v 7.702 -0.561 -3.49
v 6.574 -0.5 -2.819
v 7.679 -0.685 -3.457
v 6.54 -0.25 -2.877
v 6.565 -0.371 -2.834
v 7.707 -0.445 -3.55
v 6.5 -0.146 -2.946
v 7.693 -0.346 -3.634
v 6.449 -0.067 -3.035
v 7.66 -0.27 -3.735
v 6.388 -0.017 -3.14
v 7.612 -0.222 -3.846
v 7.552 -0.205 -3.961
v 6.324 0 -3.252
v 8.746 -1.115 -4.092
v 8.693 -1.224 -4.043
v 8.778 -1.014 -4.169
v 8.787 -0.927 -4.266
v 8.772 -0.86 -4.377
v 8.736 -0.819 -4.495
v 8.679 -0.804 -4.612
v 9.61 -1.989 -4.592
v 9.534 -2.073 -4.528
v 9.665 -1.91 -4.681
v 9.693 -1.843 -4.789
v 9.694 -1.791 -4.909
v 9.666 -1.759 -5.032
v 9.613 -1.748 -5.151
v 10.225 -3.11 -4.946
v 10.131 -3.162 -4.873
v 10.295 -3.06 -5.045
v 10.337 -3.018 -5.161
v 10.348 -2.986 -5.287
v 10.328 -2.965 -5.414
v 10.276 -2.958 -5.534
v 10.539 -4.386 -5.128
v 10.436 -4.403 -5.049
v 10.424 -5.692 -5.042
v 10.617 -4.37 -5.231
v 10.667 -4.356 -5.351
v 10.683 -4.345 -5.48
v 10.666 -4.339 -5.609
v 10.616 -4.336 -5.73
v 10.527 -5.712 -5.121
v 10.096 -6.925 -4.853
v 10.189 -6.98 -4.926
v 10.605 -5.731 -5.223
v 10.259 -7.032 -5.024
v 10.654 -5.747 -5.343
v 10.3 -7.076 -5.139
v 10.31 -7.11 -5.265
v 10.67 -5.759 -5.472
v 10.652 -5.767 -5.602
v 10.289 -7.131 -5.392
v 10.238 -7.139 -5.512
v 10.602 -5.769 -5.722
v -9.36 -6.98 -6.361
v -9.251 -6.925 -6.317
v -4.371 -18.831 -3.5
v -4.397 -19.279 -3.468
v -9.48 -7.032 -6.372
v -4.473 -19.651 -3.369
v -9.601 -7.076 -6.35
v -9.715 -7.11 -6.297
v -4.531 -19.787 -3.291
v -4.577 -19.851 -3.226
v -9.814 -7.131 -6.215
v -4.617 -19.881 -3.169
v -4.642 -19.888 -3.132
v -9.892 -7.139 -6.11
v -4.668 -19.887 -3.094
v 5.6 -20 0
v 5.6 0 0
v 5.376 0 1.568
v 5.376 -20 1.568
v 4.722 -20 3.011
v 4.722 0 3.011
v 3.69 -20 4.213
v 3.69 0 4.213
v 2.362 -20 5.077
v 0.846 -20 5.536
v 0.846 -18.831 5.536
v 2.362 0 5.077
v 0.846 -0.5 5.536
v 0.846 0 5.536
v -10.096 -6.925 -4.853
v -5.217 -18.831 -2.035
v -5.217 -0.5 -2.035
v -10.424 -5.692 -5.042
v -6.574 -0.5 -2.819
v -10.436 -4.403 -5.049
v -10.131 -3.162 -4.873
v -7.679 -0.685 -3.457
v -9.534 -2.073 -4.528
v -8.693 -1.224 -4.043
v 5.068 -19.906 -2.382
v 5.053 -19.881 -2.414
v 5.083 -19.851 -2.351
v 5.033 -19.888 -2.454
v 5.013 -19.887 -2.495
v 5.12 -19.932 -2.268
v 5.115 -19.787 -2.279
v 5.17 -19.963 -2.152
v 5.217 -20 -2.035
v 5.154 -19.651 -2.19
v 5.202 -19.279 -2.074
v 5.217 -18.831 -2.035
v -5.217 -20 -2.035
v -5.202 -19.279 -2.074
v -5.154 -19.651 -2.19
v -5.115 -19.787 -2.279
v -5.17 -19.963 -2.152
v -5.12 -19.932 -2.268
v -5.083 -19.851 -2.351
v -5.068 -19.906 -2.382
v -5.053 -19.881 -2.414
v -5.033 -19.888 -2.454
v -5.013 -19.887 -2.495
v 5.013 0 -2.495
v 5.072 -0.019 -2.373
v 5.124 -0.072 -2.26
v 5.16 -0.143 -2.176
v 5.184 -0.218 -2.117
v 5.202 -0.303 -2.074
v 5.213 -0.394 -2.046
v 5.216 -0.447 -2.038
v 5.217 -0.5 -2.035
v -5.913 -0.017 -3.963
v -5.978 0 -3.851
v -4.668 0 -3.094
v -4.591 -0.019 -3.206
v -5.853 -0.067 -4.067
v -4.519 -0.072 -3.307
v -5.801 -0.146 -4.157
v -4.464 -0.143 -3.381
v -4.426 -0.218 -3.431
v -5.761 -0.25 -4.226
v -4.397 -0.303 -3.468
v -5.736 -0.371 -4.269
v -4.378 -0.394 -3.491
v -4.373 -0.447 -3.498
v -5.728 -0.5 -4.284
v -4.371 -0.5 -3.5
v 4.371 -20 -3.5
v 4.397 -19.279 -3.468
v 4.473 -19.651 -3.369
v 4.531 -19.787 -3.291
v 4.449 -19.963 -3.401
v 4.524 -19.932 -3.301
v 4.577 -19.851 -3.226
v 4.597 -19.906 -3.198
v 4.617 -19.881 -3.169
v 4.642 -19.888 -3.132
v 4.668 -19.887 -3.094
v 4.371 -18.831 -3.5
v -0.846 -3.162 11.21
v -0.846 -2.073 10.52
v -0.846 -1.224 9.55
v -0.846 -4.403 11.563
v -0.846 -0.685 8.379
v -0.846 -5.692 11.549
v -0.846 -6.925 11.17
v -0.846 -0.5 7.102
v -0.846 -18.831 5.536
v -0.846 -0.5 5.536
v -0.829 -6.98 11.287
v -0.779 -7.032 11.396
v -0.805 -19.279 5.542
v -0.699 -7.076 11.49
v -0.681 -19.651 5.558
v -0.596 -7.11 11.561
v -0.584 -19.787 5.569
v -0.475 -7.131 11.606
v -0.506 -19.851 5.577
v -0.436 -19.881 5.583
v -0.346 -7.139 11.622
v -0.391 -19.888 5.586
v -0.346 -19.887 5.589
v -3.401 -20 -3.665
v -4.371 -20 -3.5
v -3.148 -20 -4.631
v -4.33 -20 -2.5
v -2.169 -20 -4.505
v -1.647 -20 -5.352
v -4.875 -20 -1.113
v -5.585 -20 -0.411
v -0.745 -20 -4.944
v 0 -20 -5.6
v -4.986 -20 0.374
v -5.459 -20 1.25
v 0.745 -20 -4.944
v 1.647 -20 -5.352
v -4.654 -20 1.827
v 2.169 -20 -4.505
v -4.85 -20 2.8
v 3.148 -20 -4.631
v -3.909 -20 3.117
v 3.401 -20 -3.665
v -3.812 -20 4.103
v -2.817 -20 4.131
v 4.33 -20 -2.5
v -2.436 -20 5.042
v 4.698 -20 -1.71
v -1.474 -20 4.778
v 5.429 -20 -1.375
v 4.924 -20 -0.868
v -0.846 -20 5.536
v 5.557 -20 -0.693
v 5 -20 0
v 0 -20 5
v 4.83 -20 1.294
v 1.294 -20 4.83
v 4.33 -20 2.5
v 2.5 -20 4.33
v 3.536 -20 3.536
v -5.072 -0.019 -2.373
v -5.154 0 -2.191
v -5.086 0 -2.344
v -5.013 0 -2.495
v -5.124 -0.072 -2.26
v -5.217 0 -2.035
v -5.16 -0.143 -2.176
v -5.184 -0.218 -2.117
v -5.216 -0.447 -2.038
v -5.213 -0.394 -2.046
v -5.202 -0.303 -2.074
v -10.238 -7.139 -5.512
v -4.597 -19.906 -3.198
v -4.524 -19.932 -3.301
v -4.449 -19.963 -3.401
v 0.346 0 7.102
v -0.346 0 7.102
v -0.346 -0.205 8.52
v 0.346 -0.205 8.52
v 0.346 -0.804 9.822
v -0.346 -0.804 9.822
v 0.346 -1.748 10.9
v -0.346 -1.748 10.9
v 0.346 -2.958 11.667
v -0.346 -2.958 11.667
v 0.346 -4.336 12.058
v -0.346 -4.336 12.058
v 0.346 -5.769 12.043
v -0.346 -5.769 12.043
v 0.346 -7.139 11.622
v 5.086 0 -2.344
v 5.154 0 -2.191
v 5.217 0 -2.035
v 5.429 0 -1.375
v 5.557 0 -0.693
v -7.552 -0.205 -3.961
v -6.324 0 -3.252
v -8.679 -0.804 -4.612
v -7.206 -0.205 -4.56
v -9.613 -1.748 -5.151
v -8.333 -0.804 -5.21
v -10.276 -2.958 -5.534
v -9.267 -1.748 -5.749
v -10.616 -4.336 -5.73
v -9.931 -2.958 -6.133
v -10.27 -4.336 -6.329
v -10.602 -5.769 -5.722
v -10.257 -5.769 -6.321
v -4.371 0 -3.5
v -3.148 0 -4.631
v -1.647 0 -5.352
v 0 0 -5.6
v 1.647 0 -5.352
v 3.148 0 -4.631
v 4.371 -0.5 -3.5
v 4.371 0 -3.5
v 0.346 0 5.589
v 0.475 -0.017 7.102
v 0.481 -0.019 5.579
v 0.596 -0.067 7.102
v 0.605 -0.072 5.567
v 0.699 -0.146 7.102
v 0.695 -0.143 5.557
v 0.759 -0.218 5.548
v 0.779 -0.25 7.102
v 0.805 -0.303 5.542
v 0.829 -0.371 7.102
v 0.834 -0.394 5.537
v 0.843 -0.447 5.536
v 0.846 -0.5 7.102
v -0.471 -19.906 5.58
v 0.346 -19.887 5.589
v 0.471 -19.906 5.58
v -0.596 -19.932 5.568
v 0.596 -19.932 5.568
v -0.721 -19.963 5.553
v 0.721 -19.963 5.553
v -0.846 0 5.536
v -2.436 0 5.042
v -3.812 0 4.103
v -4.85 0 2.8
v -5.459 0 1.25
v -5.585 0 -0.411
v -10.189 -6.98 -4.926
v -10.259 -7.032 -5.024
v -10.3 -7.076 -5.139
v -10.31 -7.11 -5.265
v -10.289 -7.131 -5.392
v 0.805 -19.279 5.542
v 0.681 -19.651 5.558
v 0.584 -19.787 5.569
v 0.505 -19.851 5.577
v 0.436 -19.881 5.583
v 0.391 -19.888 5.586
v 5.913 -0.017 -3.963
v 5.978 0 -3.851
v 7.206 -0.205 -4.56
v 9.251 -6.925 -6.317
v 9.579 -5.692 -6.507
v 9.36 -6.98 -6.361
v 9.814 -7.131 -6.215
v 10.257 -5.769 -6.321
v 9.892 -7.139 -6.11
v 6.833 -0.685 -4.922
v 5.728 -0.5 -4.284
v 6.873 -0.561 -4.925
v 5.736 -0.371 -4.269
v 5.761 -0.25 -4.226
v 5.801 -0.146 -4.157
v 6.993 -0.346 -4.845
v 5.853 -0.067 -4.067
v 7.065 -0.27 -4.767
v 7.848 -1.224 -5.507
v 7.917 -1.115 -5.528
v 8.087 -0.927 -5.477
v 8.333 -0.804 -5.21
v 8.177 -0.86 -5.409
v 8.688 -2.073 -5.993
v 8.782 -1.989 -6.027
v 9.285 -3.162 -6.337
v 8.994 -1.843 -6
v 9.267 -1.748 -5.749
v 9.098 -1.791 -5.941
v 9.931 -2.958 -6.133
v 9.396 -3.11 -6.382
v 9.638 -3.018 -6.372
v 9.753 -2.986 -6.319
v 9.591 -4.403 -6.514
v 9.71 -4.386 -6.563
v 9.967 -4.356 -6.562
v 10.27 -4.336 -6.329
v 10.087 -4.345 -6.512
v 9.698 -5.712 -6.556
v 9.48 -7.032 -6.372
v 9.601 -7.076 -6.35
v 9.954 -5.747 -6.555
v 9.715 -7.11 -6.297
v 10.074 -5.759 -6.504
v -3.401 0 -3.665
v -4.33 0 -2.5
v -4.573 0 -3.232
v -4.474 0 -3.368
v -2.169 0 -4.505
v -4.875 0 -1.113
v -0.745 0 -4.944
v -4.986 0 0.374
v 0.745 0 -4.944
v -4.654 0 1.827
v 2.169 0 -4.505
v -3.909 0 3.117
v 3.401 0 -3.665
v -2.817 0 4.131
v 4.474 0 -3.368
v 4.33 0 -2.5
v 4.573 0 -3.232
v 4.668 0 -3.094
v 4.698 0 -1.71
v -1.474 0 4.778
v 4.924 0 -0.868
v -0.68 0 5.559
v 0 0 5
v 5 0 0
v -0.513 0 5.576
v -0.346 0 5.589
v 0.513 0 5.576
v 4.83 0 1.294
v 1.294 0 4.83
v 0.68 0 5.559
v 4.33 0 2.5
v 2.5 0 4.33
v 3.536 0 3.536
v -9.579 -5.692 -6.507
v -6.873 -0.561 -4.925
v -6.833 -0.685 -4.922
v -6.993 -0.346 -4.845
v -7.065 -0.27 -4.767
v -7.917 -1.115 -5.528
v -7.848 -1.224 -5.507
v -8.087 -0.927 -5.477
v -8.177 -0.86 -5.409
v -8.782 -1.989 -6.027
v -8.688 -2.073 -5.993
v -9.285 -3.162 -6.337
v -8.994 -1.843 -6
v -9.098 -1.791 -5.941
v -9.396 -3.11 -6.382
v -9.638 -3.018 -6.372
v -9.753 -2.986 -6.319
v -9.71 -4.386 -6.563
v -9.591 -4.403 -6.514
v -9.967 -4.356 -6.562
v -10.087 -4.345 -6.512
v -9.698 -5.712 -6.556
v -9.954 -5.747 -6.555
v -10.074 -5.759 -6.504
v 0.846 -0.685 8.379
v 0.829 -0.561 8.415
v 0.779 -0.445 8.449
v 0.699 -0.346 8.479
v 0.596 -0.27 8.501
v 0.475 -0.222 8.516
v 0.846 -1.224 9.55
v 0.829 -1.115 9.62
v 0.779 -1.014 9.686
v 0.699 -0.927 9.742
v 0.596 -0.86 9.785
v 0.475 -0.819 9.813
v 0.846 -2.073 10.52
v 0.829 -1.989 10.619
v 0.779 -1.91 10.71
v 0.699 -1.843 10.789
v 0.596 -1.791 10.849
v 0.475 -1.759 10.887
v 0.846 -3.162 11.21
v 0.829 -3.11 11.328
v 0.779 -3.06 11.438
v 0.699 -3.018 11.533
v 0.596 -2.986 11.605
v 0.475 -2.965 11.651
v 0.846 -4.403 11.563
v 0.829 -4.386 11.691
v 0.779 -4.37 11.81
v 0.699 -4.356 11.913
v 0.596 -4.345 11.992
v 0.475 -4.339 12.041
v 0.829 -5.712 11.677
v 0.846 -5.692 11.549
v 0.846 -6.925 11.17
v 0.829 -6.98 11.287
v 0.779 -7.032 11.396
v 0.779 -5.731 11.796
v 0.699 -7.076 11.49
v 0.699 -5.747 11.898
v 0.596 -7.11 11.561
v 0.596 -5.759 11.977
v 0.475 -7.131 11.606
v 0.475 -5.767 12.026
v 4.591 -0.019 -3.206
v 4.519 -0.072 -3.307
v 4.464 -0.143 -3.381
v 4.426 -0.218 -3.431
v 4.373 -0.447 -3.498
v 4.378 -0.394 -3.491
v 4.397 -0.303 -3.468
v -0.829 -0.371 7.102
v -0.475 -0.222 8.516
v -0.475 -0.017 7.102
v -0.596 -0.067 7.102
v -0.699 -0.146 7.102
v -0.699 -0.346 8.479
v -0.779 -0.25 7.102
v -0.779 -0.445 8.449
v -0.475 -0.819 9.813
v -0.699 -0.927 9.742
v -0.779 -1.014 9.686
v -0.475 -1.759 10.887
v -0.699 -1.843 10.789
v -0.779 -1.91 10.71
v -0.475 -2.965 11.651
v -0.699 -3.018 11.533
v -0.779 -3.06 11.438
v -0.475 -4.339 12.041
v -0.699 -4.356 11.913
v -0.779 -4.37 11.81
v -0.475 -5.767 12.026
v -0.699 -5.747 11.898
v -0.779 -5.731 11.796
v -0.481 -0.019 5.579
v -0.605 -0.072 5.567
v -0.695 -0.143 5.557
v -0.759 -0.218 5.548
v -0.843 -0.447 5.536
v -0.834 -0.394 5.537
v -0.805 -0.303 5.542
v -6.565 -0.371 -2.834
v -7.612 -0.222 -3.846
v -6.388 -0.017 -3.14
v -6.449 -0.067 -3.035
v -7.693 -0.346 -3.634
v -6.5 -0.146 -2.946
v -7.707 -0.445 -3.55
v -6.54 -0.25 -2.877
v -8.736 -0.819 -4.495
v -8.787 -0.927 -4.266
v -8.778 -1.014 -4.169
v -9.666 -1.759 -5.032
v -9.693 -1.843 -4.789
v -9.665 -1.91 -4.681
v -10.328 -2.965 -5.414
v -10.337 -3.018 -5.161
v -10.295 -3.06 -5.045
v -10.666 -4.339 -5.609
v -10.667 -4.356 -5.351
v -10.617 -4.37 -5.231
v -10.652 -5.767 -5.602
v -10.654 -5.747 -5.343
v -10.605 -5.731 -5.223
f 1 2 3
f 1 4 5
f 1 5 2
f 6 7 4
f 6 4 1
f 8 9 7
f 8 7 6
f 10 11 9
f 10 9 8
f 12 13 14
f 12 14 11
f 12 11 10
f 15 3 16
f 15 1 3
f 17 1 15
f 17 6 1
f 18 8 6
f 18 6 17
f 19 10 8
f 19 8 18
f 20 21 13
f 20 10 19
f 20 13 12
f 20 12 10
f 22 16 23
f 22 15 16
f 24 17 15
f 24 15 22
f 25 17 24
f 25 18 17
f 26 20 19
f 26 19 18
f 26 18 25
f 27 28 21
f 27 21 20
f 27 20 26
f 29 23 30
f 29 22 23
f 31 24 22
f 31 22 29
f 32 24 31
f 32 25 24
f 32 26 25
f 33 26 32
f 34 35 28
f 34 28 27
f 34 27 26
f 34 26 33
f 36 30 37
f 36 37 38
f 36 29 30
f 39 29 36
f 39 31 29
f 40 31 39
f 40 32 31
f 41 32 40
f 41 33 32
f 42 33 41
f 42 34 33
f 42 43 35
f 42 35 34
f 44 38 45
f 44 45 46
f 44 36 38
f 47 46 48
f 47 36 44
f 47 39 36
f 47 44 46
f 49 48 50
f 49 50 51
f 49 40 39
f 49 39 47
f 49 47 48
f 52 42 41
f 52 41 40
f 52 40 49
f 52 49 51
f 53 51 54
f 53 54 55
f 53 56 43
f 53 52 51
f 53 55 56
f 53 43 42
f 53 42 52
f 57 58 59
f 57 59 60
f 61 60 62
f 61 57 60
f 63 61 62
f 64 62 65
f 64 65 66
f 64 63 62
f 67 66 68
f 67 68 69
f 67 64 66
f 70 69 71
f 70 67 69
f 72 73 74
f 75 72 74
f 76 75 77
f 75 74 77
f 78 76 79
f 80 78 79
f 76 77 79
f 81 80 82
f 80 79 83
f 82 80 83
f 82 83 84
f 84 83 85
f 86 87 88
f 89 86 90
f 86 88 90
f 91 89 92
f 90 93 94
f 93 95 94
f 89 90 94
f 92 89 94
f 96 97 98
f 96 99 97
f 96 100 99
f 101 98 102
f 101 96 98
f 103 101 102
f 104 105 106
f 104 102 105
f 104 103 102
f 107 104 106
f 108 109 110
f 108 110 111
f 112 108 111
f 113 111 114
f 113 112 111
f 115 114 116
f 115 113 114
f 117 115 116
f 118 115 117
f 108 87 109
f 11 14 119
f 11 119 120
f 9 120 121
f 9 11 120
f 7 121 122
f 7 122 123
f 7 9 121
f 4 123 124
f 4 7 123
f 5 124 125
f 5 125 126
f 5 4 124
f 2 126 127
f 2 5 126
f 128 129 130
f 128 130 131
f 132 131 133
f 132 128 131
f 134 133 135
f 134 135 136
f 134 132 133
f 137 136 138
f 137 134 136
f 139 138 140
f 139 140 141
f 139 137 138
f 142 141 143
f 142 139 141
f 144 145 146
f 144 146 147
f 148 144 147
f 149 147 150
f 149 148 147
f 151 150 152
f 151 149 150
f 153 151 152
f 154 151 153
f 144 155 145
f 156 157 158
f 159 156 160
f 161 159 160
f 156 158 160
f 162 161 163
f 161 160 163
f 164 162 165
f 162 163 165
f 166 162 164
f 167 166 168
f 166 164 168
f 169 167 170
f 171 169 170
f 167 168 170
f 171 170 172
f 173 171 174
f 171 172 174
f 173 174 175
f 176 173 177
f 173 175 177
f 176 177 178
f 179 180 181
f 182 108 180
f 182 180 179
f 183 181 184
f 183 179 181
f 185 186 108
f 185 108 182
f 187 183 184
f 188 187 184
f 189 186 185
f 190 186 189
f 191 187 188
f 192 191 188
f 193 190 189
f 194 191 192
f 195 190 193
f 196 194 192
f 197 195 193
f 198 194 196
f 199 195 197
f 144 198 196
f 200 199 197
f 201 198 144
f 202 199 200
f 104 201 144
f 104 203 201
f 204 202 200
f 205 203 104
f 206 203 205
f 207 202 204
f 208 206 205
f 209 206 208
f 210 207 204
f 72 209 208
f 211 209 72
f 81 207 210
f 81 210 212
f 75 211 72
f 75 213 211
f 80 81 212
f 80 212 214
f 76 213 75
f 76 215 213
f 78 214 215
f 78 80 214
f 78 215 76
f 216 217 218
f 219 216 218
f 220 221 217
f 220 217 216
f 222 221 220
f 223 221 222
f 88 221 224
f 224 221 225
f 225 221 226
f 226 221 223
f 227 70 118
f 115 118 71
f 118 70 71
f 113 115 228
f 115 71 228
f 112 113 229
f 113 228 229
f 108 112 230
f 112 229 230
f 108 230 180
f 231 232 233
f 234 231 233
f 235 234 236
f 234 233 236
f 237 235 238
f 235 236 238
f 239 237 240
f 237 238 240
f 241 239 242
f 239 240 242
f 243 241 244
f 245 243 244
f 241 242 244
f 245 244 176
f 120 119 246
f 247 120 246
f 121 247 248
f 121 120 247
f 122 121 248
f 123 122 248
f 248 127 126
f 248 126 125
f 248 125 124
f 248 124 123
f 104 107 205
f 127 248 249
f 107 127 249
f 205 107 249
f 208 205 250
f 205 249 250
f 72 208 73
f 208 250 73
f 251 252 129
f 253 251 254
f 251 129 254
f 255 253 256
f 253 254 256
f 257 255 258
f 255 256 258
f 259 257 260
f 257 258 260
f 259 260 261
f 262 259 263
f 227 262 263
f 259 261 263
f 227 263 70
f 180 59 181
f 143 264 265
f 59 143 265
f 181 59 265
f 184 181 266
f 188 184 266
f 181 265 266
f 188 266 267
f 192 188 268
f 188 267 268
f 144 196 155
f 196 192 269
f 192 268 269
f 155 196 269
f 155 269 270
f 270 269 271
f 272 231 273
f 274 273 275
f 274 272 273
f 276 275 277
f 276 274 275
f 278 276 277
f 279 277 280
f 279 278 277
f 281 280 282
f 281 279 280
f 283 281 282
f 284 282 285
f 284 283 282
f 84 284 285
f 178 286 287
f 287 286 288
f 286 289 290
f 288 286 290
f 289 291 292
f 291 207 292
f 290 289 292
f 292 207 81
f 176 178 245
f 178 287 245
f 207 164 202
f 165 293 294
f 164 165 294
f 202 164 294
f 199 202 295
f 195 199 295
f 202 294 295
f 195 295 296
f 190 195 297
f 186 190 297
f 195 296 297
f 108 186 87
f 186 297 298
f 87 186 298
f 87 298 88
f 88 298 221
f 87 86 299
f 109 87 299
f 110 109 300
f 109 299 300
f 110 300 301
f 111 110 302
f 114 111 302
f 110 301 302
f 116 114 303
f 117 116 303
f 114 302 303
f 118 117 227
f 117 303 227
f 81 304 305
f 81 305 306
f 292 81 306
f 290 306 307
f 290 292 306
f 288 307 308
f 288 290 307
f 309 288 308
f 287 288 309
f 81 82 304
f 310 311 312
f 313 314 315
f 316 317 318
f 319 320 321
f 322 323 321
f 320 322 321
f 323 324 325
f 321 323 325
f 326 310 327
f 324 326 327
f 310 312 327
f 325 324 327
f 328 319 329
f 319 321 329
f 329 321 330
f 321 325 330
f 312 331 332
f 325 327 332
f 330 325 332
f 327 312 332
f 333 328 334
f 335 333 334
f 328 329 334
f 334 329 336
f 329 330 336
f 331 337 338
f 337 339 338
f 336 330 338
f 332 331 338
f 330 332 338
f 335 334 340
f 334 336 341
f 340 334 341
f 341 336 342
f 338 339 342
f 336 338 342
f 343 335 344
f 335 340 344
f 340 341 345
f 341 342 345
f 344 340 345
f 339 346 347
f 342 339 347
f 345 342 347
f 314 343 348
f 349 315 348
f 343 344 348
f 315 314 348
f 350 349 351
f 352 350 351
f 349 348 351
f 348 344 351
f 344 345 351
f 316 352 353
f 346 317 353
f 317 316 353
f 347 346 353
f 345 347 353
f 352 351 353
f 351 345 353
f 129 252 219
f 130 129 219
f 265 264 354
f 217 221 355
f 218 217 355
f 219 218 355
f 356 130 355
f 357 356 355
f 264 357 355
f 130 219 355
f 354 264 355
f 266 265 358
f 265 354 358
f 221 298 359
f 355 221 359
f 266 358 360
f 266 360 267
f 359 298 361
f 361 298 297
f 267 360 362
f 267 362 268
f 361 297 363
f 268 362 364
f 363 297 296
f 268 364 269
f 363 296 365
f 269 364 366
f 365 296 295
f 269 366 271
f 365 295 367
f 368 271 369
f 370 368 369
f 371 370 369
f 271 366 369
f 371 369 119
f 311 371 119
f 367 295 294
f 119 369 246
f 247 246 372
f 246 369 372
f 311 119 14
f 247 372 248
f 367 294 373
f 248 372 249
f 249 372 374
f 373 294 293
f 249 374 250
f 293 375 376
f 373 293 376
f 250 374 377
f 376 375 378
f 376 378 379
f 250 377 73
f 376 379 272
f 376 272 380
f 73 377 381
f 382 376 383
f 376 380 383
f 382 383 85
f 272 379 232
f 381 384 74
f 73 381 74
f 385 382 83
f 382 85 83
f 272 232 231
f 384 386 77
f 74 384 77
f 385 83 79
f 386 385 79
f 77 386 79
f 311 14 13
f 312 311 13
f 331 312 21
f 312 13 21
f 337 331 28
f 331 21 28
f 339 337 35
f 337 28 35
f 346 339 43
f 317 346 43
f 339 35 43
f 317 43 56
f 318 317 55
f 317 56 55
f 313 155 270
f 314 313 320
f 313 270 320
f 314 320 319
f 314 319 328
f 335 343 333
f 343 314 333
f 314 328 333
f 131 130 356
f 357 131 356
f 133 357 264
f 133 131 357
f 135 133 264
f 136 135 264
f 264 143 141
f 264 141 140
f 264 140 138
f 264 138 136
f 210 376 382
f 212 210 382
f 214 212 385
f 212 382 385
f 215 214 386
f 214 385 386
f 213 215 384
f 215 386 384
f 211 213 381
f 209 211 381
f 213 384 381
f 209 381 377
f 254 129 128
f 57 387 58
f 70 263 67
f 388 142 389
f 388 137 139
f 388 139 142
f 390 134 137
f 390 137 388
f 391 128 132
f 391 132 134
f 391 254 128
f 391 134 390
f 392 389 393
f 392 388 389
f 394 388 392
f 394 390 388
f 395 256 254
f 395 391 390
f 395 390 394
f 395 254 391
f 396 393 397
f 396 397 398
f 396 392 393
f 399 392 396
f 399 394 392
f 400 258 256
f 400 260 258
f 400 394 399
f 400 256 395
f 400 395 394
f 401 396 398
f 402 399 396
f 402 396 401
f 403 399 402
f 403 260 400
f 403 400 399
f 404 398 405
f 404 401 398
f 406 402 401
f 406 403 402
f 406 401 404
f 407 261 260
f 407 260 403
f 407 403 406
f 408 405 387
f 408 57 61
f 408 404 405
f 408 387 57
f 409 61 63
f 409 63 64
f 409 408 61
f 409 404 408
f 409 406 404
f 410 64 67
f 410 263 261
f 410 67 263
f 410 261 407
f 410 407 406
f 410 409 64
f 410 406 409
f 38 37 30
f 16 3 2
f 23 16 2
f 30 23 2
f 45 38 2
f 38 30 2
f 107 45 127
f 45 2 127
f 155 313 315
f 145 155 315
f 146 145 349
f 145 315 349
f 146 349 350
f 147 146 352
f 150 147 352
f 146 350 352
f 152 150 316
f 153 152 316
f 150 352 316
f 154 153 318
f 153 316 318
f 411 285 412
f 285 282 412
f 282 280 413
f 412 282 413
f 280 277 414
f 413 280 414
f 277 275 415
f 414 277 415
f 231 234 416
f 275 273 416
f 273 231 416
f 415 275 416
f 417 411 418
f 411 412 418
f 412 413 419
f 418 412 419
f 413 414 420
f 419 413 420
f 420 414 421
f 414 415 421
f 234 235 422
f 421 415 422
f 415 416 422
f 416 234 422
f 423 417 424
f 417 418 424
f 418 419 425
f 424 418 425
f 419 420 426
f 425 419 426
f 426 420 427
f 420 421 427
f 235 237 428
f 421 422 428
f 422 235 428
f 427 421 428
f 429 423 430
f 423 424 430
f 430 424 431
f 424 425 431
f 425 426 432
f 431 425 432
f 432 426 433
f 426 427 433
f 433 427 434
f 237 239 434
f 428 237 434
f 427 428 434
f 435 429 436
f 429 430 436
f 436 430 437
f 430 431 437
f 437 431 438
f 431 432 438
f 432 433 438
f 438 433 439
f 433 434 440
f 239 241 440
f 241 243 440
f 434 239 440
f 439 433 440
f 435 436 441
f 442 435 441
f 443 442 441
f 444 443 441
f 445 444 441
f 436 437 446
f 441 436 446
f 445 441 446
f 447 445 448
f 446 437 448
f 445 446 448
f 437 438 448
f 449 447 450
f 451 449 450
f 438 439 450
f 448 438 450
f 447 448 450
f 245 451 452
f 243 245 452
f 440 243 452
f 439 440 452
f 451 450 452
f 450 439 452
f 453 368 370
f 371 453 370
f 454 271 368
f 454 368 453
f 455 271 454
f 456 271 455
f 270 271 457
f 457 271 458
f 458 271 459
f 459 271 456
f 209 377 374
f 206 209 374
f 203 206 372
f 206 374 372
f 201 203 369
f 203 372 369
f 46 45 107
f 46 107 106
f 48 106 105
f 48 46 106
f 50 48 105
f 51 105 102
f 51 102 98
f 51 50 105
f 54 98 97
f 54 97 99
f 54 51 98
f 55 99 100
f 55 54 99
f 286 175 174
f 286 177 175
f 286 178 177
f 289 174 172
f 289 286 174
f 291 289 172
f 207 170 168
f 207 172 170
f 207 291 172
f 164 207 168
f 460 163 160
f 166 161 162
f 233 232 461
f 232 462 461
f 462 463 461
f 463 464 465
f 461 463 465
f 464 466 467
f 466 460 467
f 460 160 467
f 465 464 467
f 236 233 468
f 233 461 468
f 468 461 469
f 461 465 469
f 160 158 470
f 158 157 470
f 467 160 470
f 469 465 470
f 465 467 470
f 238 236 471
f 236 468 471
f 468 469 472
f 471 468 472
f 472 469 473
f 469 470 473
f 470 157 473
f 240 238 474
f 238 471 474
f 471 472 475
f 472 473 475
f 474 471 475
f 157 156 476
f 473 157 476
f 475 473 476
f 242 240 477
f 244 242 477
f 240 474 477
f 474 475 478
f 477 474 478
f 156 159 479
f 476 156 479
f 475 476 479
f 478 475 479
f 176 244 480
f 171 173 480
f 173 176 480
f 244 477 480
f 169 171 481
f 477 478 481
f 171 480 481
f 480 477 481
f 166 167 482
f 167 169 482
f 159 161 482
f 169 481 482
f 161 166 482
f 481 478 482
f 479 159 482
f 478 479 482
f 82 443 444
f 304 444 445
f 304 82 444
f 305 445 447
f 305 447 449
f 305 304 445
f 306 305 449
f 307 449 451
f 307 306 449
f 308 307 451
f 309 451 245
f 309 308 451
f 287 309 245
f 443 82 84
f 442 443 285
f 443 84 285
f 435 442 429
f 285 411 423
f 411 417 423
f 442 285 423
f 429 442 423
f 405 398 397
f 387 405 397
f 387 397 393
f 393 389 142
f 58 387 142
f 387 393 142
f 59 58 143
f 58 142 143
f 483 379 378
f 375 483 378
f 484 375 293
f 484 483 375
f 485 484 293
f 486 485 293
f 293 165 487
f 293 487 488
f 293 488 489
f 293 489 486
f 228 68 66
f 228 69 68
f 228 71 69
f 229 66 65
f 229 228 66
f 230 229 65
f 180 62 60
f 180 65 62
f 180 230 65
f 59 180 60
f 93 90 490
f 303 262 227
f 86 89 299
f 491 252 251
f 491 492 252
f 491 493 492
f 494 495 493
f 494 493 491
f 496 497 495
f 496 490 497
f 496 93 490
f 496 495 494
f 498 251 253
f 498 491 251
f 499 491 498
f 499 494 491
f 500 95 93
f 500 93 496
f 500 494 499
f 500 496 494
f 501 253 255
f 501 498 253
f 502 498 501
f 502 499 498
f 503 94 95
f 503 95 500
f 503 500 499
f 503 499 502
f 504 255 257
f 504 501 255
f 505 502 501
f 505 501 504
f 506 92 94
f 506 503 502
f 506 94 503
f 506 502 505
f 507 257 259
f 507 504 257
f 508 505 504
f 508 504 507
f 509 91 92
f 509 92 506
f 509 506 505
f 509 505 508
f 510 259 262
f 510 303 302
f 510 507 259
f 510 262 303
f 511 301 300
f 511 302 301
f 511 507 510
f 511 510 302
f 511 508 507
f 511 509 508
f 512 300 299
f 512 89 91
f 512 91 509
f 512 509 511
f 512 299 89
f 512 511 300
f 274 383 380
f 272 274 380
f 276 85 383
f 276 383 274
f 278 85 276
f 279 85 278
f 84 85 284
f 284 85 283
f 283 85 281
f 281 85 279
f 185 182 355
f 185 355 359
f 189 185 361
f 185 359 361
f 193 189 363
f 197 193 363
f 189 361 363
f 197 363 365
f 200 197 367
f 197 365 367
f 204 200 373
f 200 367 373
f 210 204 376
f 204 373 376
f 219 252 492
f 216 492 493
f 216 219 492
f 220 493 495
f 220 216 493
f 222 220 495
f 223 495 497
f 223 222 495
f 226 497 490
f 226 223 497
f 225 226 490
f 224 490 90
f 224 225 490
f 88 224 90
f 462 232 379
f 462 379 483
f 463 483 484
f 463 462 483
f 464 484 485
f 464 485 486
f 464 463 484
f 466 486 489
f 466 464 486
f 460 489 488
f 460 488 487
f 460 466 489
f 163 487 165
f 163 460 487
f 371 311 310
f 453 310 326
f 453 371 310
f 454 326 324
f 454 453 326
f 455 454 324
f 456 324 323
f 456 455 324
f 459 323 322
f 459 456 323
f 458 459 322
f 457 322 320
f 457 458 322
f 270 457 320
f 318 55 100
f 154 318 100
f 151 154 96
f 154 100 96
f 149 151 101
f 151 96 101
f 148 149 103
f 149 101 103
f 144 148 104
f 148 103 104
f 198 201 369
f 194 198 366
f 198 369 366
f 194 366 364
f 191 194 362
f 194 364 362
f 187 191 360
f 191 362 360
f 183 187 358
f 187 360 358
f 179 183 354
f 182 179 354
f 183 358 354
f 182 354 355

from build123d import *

# Parameters (mm, degrees)
F1_DEPTH      = 20
F2_DEPTH      = 20
F4_DEPTH      = 14.8
F5_R          = 5
F6_DEPTH      = 20
F8_DEPTH      = 25
F10_DEPTH     = 25
F11_R         = 5
F12_T4_DEPTH  = 15.4786422769
F12_S5_R      = 5.6
F12_T6_DEPTH  = 9
F12_T10_DEPTH = 15.4786422769
F12_S11_R     = 5.6
F12_T12_DEPTH = 9
F12_T14_ANGLE = 115.3240588084
F12_T16_ANGLE = 115.3240588084
F12_T20_DEPTH = 2.8166081333
F12_S21_R     = 5.6
F12_T22_DEPTH = 3
F12_T26_DEPTH = 2.8166081333
F12_S27_R     = 5.6
F12_T28_DEPTH = 3
F13_T4_DEPTH  = 15.4786422769
F13_S5_R      = 5.6
F13_T6_DEPTH  = 9
F13_T10_DEPTH = 15.4786422769
F13_S11_R     = 5.6
F13_T12_DEPTH = 10
F13_T16_DEPTH = 15.4786422769
F13_S17_R     = 5.6
F13_T18_DEPTH = 10
F13_T22_DEPTH = 15.4786422769
F13_S23_R     = 5.6
F13_T24_DEPTH = 9
F13_T28_DEPTH = 2.8166081333
F13_S29_R     = 5.6
F13_T30_DEPTH = 3
F13_T34_DEPTH = 2.8166081333
F13_S35_R     = 5.6
F13_T36_DEPTH = 3
F13_T40_DEPTH = 2.8166081333
F13_S41_R     = 5.6
F13_T42_DEPTH = 3
F13_T46_DEPTH = 2.8166081333
F13_S47_R     = 5.6
F13_T48_DEPTH = 3
F13_T50_ANGLE = 115.3240588084
F13_T52_ANGLE = 115.3240588084
F13_T54_ANGLE = 115.3240588084
F13_T56_ANGLE = 115.3240588084


# Not quite as in the source:
# - a fillet or chamfer that OpenCascade refuses, or shapes differently, is made with other operations: its cross-section is extruded or revolved along the edge and cut away or added


with BuildPart() as f1:
    # F0 (on Front) → F1 (new body)
    with BuildSketch(Plane.XZ):
        with BuildLine():
            ThreePointArc((-4.3301270189, -2.5), (-4.3301270189, 2.5), (0, 5))
            Line((0, 5), (-0.8457466924, 5))
            Line((-0.8457466924, 5), (-0.8457466924, 5.5357666617))
            ThreePointArc((-0.8457466924, 5.5357666617), (-4.8497422612, 2.8), (-5.2169879046, -2.03544521))
            Line((-5.2169879046, -2.03544521), (-4.7530003651, -1.7675618792))
            Line((-4.7530003651, -1.7675618792), (-4.3301270189, -2.5))
        make_face()
        with BuildLine():
            Line((3.9072536727, -3.2324381208), (4.3301270189, -2.5))
            ThreePointArc((4.3301270189, -2.5), (0, -5), (-4.3301270189, -2.5))
            Line((-4.3301270189, -2.5), (-3.9072536727, -3.2324381208))
            Line((-3.9072536727, -3.2324381208), (-4.3712412122, -3.5003214516))
            ThreePointArc((-4.3712412122, -3.5003214516), (0, -5.6), (4.3712412122, -3.5003214516))
            Line((4.3712412122, -3.5003214516), (3.9072536727, -3.2324381208))
        make_face()
        with BuildLine():
            Line((-3.9072536727, -3.2324381208), (-4.3301270189, -2.5))
            Line((-4.3301270189, -2.5), (-4.8497422612, -2.8))
            ThreePointArc((-4.8497422612, -2.8), (-4.6237697378, -3.1592330417), (-4.3712412122, -3.5003214516))
            Line((-4.3712412122, -3.5003214516), (-3.9072536727, -3.2324381208))
        make_face()
        with BuildLine():
            Line((-4.8497422612, -2.8), (-4.3301270189, -2.5))
            Line((-4.3301270189, -2.5), (-4.7530003651, -1.7675618792))
            Line((-4.7530003651, -1.7675618792), (-5.2169879046, -2.03544521))
            ThreePointArc((-5.2169879046, -2.03544521), (-5.0478609395, -2.4246855333), (-4.8497422612, -2.8))
        make_face()
        with BuildLine():
            Line((4.8497422612, -2.8), (4.3301270189, -2.5))
            Line((4.3301270189, -2.5), (3.9072536727, -3.2324381208))
            Line((3.9072536727, -3.2324381208), (4.3712412122, -3.5003214516))
            ThreePointArc((4.3712412122, -3.5003214516), (4.6237697378, -3.1592330417), (4.8497422612, -2.8))
        make_face()
        with BuildLine():
            Line((4.7530003651, -1.7675618792), (4.3301270189, -2.5))
            Line((4.3301270189, -2.5), (4.8497422612, -2.8))
            ThreePointArc((4.8497422612, -2.8), (5.0478609395, -2.4246855333), (5.2169879046, -2.03544521))
            Line((5.2169879046, -2.03544521), (4.7530003651, -1.7675618792))
        make_face()
        with BuildLine():
            ThreePointArc((0, 5), (3.5355339059, 3.5355339059), (5, 0))
            ThreePointArc((5, 0), (4.8296291314, -1.2940952255), (4.3301270189, -2.5))
            Line((4.3301270189, -2.5), (4.7530003651, -1.7675618792))
            Line((4.7530003651, -1.7675618792), (5.2169879046, -2.03544521))
            ThreePointArc((5.2169879046, -2.03544521), (5.5034140434, -1.0355838291), (5.6, 0))
            ThreePointArc((5.6, 0), (4.2483044546, 3.6485489254), (0.8457466924, 5.5357666617))
            Line((0.8457466924, 5.5357666617), (0.8457466924, 5))
            Line((0.8457466924, 5), (0, 5))
        make_face()
        with BuildLine():
            Line((0, 5.6), (0, 5))
            Line((0, 5), (0.8457466924, 5))
            Line((0.8457466924, 5), (0.8457466924, 5.5357666617))
            ThreePointArc((0.8457466924, 5.5357666617), (0.4240912017, 5.583918575), (0, 5.6))
        make_face()
        with BuildLine():
            Line((-0.8457466924, 5), (0, 5))
            Line((0, 5), (0, 5.6))
            ThreePointArc((0, 5.6), (-0.4240912017, 5.583918575), (-0.8457466924, 5.5357666617))
            Line((-0.8457466924, 5.5357666617), (-0.8457466924, 5))
        make_face()
    extrude(amount=F1_DEPTH)

    # F0 (on Front) → F2 (join)
    with BuildSketch(Plane.XZ):
        with BuildLine():
            ThreePointArc((-4.3712412122, -3.5003214516), (-4.6237697378, -3.1592330417), (-4.8497422612, -2.8))
            Line((-4.8497422612, -2.8), (-12.9903810568, -7.5))
            Line((-12.9903810568, -7.5), (-12.5675077106, -8.2324381208))
            Line((-12.5675077106, -8.2324381208), (-4.3712412122, -3.5003214516))
        make_face()
        with BuildLine():
            Line((-12.9903810568, -7.5), (-4.8497422612, -2.8))
            ThreePointArc((-4.8497422612, -2.8), (-5.0478609395, -2.4246855333), (-5.2169879046, -2.03544521))
            Line((-5.2169879046, -2.03544521), (-13.413254403, -6.7675618792))
            Line((-13.413254403, -6.7675618792), (-12.9903810568, -7.5))
        make_face()
    extrude(amount=F2_DEPTH)

    # F3 (on face) → F4 (cut)
    with BuildSketch(Plane(origin=(0.4228733462, 0, -0.7324381208), x_dir=(0.8660254038, 0, 0.5), z_dir=(0.5, 0, -0.8660254038))):
        Polygon((-15, 0), (-5.5357666617, 20), (-15, 20), align=None)
    extrude(amount=-F4_DEPTH, mode=Mode.SUBTRACT)

    # F5
    f5_edges = [f1.edges().sort_by_distance(p)[0] for p in [
        (-12.990381, 0, -7.5),
    ]]
    fillet(f5_edges, radius=F5_R)

    # F0 (on Front) → F6 (join)
    with BuildSketch(Plane.XZ):
        with BuildLine():
            ThreePointArc((-0.8457466924, 5.5357666617), (-0.4240912017, 5.583918575), (0, 5.6))
            Line((0, 5.6), (0, 15))
            Line((0, 15), (-0.8457466924, 15))
            Line((-0.8457466924, 15), (-0.8457466924, 5.5357666617))
        make_face()
        with BuildLine():
            Line((0, 15), (0, 5.6))
            ThreePointArc((0, 5.6), (0.4240912017, 5.583918575), (0.8457466924, 5.5357666617))
            Line((0.8457466924, 5.5357666617), (0.8457466924, 15))
            Line((0.8457466924, 15), (0, 15))
        make_face()
        with BuildLine():
            ThreePointArc((5.2169879046, -2.03544521), (5.0478609395, -2.4246855333), (4.8497422612, -2.8))
            Line((4.8497422612, -2.8), (12.9903810568, -7.5))
            Line((12.9903810568, -7.5), (13.413254403, -6.7675618792))
            Line((13.413254403, -6.7675618792), (5.2169879046, -2.03544521))
        make_face()
        with BuildLine():
            Line((12.9903810568, -7.5), (4.8497422612, -2.8))
            ThreePointArc((4.8497422612, -2.8), (4.6237697378, -3.1592330417), (4.3712412122, -3.5003214516))
            Line((4.3712412122, -3.5003214516), (12.5675077106, -8.2324381208))
            Line((12.5675077106, -8.2324381208), (12.9903810568, -7.5))
        make_face()
    extrude(amount=F6_DEPTH)

    # F7 (on face) → F8 (cut)
    with BuildSketch(Plane(origin=(0.4228733462, 0, 0.7324381208), x_dir=(0.8660254038, 0, -0.5), z_dir=(0.5, 0, 0.8660254038))):
        Polygon((15, 0), (5.5357666617, -20), (15, -20), align=None)
    extrude(amount=-F8_DEPTH, mode=Mode.SUBTRACT)

    # F9 (on face) → F10 (cut)
    with BuildSketch(Plane.YZ.offset(0.8457466924)):
        Polygon((-20, 15), (-20, 5.5357666617), (0, 15), align=None)
    extrude(amount=-F10_DEPTH, mode=Mode.SUBTRACT)

    # F11
    f11_edges = [f1.edges().sort_by_distance(p)[0] for p in [
        (12.990381, 0, -7.5),
        (0, 0, 15),
    ]]
    fillet(f11_edges, radius=F11_R)

    # F12: fillet of radius 0.5 on 4 edges, made by hand


with BuildPart() as f12_tool2:
    # F12_s3 → F12_t4 (new body)
    with BuildSketch(Plane(origin=(0, -15.3303811163, -7.2545152025), x_dir=(1, 0, 0), z_dir=(0, 0.9039030201, 0.4277374549))):
        with BuildLine():
            ThreePointArc((0.8457466924, -13.0585453012), (0.699300083, -13.4120986918), (0.3457466924, -13.5585453012))
            Line((0.3457466924, -13.5585453012), (0.8457466924, -13.5585453012))
            Line((0.8457466924, -13.5585453012), (0.8457466924, -13.0585453012))
        make_face()
    extrude(amount=F12_T4_DEPTH)

    # F12_s5 → F12_t6 (cut, symmetric)
    with BuildSketch(Plane.XZ.offset(14)):
        Circle(F12_S5_R)
    extrude(amount=F12_T6_DEPTH, both=True, mode=Mode.SUBTRACT)


with BuildPart() as f1_1:
    add(f1.part)

    # F12_t1: cut F12_tool2
    add(f12_tool2.part, mode=Mode.SUBTRACT)


with BuildPart() as f12_tool8:
    # F12_s9 → F12_t10 (new body)
    with BuildSketch(Plane(origin=(0, -15.3303811163, -7.2545152025), x_dir=(1, 0, 0), z_dir=(0, 0.9039030201, 0.4277374549))):
        with BuildLine():
            ThreePointArc((-0.8457466924, -13.0585453012), (-0.699300083, -13.4120986918), (-0.3457466924, -13.5585453012))
            Line((-0.3457466924, -13.5585453012), (-0.8457466924, -13.5585453012))
            Line((-0.8457466924, -13.5585453012), (-0.8457466924, -13.0585453012))
        make_face()
    extrude(amount=F12_T10_DEPTH)

    # F12_s11 → F12_t12 (cut, symmetric)
    with BuildSketch(Plane.XZ.offset(14)):
        Circle(F12_S11_R)
    extrude(amount=F12_T12_DEPTH, both=True, mode=Mode.SUBTRACT)


with BuildPart() as f1_2:
    add(f1_1.part)

    # F12_t7: cut F12_tool8
    add(f12_tool8.part, mode=Mode.SUBTRACT)

    # F12_s13 → F12_t14 (revolve, cut)
    with BuildSketch(Plane.XY.offset(7.1023747949)):
        with BuildLine():
            ThreePointArc((0.8457466924, -0.5), (0.699300083, -0.1464466094), (0.3457466924, 0))
            Line((0.3457466924, 0), (0.8457466924, 0))
            Line((0.8457466924, 0), (0.8457466924, -0.5))
        make_face()
    revolve(axis=Axis((0.8457466924, -5, 7.1023747949), (1, 0, 0)), revolution_arc=F12_T14_ANGLE, mode=Mode.SUBTRACT)

    # F12_s15 → F12_t16 (revolve, cut)
    with BuildSketch(Plane.XY.offset(7.1023747949)):
        with BuildLine():
            ThreePointArc((-0.3457466924, 0), (-0.699300083, -0.1464466094), (-0.8457466924, -0.5))
            Line((-0.8457466924, -0.5), (-0.8457466924, 0))
            Line((-0.8457466924, 0), (-0.3457466924, 0))
        make_face()
    revolve(axis=Axis((-0.8457466924, -5, 7.1023747949), (1, 0, 0)), revolution_arc=F12_T16_ANGLE, mode=Mode.SUBTRACT)


with BuildPart() as f12_tool18:
    # F12_s19 → F12_t20 (new body)
    with BuildSketch(Plane.XY.offset(7.1023747949)):
        with BuildLine():
            ThreePointArc((-0.3457466924, 0), (-0.699300083, -0.1464466094), (-0.8457466924, -0.5))
            Line((-0.8457466924, -0.5), (-0.8457466924, 0))
            Line((-0.8457466924, 0), (-0.3457466924, 0))
        make_face()
    extrude(amount=-F12_T20_DEPTH)

    # F12_s21 → F12_t22 (cut, symmetric)
    with BuildSketch(Plane.XZ.offset(0.2)):
        Circle(F12_S21_R)
    extrude(amount=F12_T22_DEPTH, both=True, mode=Mode.SUBTRACT)


with BuildPart() as f1_3:
    add(f1_2.part)

    # F12_t17: cut F12_tool18
    add(f12_tool18.part, mode=Mode.SUBTRACT)


with BuildPart() as f12_tool24:
    # F12_s25 → F12_t26 (new body)
    with BuildSketch(Plane.XY.offset(4.2857666617)):
        with BuildLine():
            ThreePointArc((0.3457466924, 0), (0.699300083, -0.1464466094), (0.8457466924, -0.5))
            Line((0.8457466924, -0.5), (0.8457466924, 0))
            Line((0.8457466924, 0), (0.3457466924, 0))
        make_face()
    extrude(amount=F12_T26_DEPTH)

    # F12_s27 → F12_t28 (cut, symmetric)
    with BuildSketch(Plane.XZ.offset(0.2)):
        Circle(F12_S27_R)
    extrude(amount=F12_T28_DEPTH, both=True, mode=Mode.SUBTRACT)


with BuildPart() as f1_4:
    add(f1_3.part)

    # F12_t23: cut F12_tool24
    add(f12_tool24.part, mode=Mode.SUBTRACT)

    # F13: fillet of radius 0.5 on 12 edges, made by hand


with BuildPart() as f13_tool2:
    # F13_s3 → F13_t4 (new body)
    with BuildSketch(Plane(origin=(-0.548817749, -1.3391896155, 0.3168600751), x_dir=(0.9253125221, -0.3792054013, 0), z_dir=(-0.3704315021, -0.9039030201, 0.2138687274))):
        with BuildLine():
            ThreePointArc((11.9681833862, -5.2918313734), (12.2138673733, -5.5852355109), (12.1801241312, -5.9664283795))
            Line((12.1801241312, -5.9664283795), (12.4114522618, -5.5231595039))
            Line((12.4114522618, -5.5231595039), (11.9681833862, -5.2918313734))
        make_face()
    extrude(amount=F13_T4_DEPTH)

    # F13_s5 → F13_t6 (cut, symmetric)
    with BuildSketch(Plane.XZ.offset(14)):
        Circle(F13_S5_R)
    extrude(amount=F13_T6_DEPTH, both=True, mode=Mode.SUBTRACT)


with BuildPart() as f1_5:
    add(f1_4.part)

    # F13_t1: cut F13_tool2
    add(f13_tool2.part, mode=Mode.SUBTRACT)


with BuildPart() as f13_tool8:
    # F13_s9 → F13_t10 (new body)
    with BuildSketch(Plane(origin=(-0.548817749, -1.3391896155, 0.3168600751), x_dir=(0.9253125221, -0.3792054013, 0), z_dir=(-0.3704315021, -0.9039030201, 0.2138687274))):
        with BuildLine():
            ThreePointArc((11.1856033812, -6.7914041148), (11.5667962497, -6.8251473568), (11.8602003872, -6.5794633698))
            Line((11.8602003872, -6.5794633698), (11.6288722567, -7.0227322453))
            Line((11.6288722567, -7.0227322453), (11.1856033812, -6.7914041148))
        make_face()
    extrude(amount=F13_T10_DEPTH)

    # F13_s11 → F13_t12 (cut, symmetric)
    with BuildSketch(Plane.XZ.offset(14)):
        Circle(F13_S11_R)
    extrude(amount=F13_T12_DEPTH, both=True, mode=Mode.SUBTRACT)


with BuildPart() as f1_6:
    add(f1_5.part)

    # F13_t7: cut F13_tool8
    add(f13_tool8.part, mode=Mode.SUBTRACT)


with BuildPart() as f13_tool14:
    # F13_s15 → F13_t16 (new body)
    with BuildSketch(Plane(origin=(0.548817749, -1.3391896155, 0.3168600751), x_dir=(0.9253125221, 0.3792054013, 0), z_dir=(0.3704315021, -0.9039030201, 0.2138687274))):
        with BuildLine():
            ThreePointArc((-11.1856033812, -6.7914041148), (-11.5667962497, -6.8251473568), (-11.8602003872, -6.5794633698))
            Line((-11.8602003872, -6.5794633698), (-11.6288722567, -7.0227322453))
            Line((-11.6288722567, -7.0227322453), (-11.1856033812, -6.7914041148))
        make_face()
    extrude(amount=F13_T16_DEPTH)

    # F13_s17 → F13_t18 (cut, symmetric)
    with BuildSketch(Plane.XZ.offset(14)):
        Circle(F13_S17_R)
    extrude(amount=F13_T18_DEPTH, both=True, mode=Mode.SUBTRACT)


with BuildPart() as f1_7:
    add(f1_6.part)

    # F13_t13: cut F13_tool14
    add(f13_tool14.part, mode=Mode.SUBTRACT)


with BuildPart() as f13_tool20:
    # F13_s21 → F13_t22 (new body)
    with BuildSketch(Plane(origin=(0.548817749, -1.3391896155, 0.3168600751), x_dir=(0.9253125221, 0.3792054013, 0), z_dir=(0.3704315021, -0.9039030201, 0.2138687274))):
        with BuildLine():
            ThreePointArc((-11.9681833862, -5.2918313734), (-12.2138673733, -5.5852355109), (-12.1801241312, -5.9664283795))
            Line((-12.1801241312, -5.9664283795), (-12.4114522618, -5.5231595039))
            Line((-12.4114522618, -5.5231595039), (-11.9681833862, -5.2918313734))
        make_face()
    extrude(amount=F13_T22_DEPTH)

    # F13_s23 → F13_t24 (cut, symmetric)
    with BuildSketch(Plane.XZ.offset(14)):
        Circle(F13_S23_R)
    extrude(amount=F13_T24_DEPTH, both=True, mode=Mode.SUBTRACT)


with BuildPart() as f1_8:
    add(f1_7.part)

    # F13_t19: cut F13_tool20
    add(f13_tool20.part, mode=Mode.SUBTRACT)


with BuildPart() as f13_tool26:
    # F13_s27 → F13_t28 (new body)
    with BuildSketch(Plane(origin=(3.7115828037, 0, -2.1428833308), x_dir=(0, 1, 0), z_dir=(0.8660254038, 0, -0.5))):
        with BuildLine():
            ThreePointArc((0, -0.3457466924), (-0.1464466094, -0.699300083), (-0.5, -0.8457466924))
            Line((-0.5, -0.8457466924), (0, -0.8457466924))
            Line((0, -0.8457466924), (0, -0.3457466924))
        make_face()
    extrude(amount=F13_T28_DEPTH)

    # F13_s29 → F13_t30 (cut, symmetric)
    with BuildSketch(Plane.XZ.offset(0.2)):
        Circle(F13_S29_R)
    extrude(amount=F13_T30_DEPTH, both=True, mode=Mode.SUBTRACT)


with BuildPart() as f1_9:
    add(f1_8.part)

    # F13_t25: cut F13_tool26
    add(f13_tool26.part, mode=Mode.SUBTRACT)


with BuildPart() as f13_tool32:
    # F13_s33 → F13_t34 (new body)
    with BuildSketch(Plane(origin=(-6.1508369996, 0, -3.5511873975), x_dir=(0, 1, 0), z_dir=(0.8660254038, 0, 0.5))):
        with BuildLine():
            ThreePointArc((0, -0.3457466924), (-0.1464466094, -0.699300083), (-0.5, -0.8457466924))
            Line((-0.5, -0.8457466924), (0, -0.8457466924))
            Line((0, -0.8457466924), (0, -0.3457466924))
        make_face()
    extrude(amount=F13_T34_DEPTH)

    # F13_s35 → F13_t36 (cut, symmetric)
    with BuildSketch(Plane.XZ.offset(0.3)):
        Circle(F13_S35_R)
    extrude(amount=F13_T36_DEPTH, both=True, mode=Mode.SUBTRACT)


with BuildPart() as f1_10:
    add(f1_9.part)

    # F13_t31: cut F13_tool32
    add(f13_tool32.part, mode=Mode.SUBTRACT)


with BuildPart() as f13_tool38:
    # F13_s39 → F13_t40 (new body)
    with BuildSketch(Plane(origin=(-3.7115828037, 0, -2.1428833308), x_dir=(0, 1, 0), z_dir=(-0.8660254038, 0, -0.5))):
        with BuildLine():
            ThreePointArc((0, -0.3457466924), (-0.1464466094, -0.699300083), (-0.5, -0.8457466924))
            Line((-0.5, -0.8457466924), (0, -0.8457466924))
            Line((0, -0.8457466924), (0, -0.3457466924))
        make_face()
    extrude(amount=F13_T40_DEPTH)

    # F13_s41 → F13_t42 (cut, symmetric)
    with BuildSketch(Plane.XZ.offset(0.3)):
        Circle(F13_S41_R)
    extrude(amount=F13_T42_DEPTH, both=True, mode=Mode.SUBTRACT)


with BuildPart() as f1_11:
    add(f1_10.part)

    # F13_t37: cut F13_tool38
    add(f13_tool38.part, mode=Mode.SUBTRACT)


with BuildPart() as f13_tool44:
    # F13_s45 → F13_t46 (new body)
    with BuildSketch(Plane(origin=(6.1508369996, 0, -3.5511873975), x_dir=(0, 1, 0), z_dir=(-0.8660254038, 0, 0.5))):
        with BuildLine():
            ThreePointArc((0, -0.3457466924), (-0.1464466094, -0.699300083), (-0.5, -0.8457466924))
            Line((-0.5, -0.8457466924), (0, -0.8457466924))
            Line((0, -0.8457466924), (0, -0.3457466924))
        make_face()
    extrude(amount=F13_T46_DEPTH)

    # F13_s47 → F13_t48 (cut, symmetric)
    with BuildSketch(Plane.XZ.offset(0.2)):
        Circle(F13_S47_R)
    extrude(amount=F13_T48_DEPTH, both=True, mode=Mode.SUBTRACT)


with BuildPart() as f1_12:
    add(f1_11.part)

    # F13_t43: cut F13_tool44
    add(f13_tool44.part, mode=Mode.SUBTRACT)

    # F13_s49 → F13_t50 (revolve, cut)
    with BuildSketch(Plane(origin=(6.1508369996, 0, -3.5511873975), x_dir=(0, 1, 0), z_dir=(-0.8660254038, 0, 0.5))):
        with BuildLine():
            ThreePointArc((-0.5, 0.8457466924), (-0.1464466094, 0.699300083), (0, 0.3457466924))
            Line((0, 0.3457466924), (0, 0.8457466924))
            Line((0, 0.8457466924), (-0.5, 0.8457466924))
        make_face()
    revolve(axis=Axis((5.7279636534, -5, -4.2836255183), (-0.5, 0, -0.8660254038)), revolution_arc=F13_T50_ANGLE, mode=Mode.SUBTRACT)

    # F13_s51 → F13_t52 (revolve, cut)
    with BuildSketch(Plane(origin=(-6.1508369996, 0, -3.5511873975), x_dir=(0, 1, 0), z_dir=(0.8660254038, 0, 0.5))):
        with BuildLine():
            ThreePointArc((-0.5, -0.8457466924), (-0.1464466094, -0.699300083), (0, -0.3457466924))
            Line((0, -0.3457466924), (0, -0.8457466924))
            Line((0, -0.8457466924), (-0.5, -0.8457466924))
        make_face()
    revolve(axis=Axis((-5.7279636534, -5, -4.2836255183), (-0.5, 0, 0.8660254038)), revolution_arc=F13_T52_ANGLE, mode=Mode.SUBTRACT)

    # F13_s53 → F13_t54 (revolve, cut)
    with BuildSketch(Plane(origin=(-6.1508369996, 0, -3.5511873975), x_dir=(0, 1, 0), z_dir=(0.8660254038, 0, 0.5))):
        with BuildLine():
            ThreePointArc((0, 0.3457466924), (-0.1464466094, 0.699300083), (-0.5, 0.8457466924))
            Line((-0.5, 0.8457466924), (0, 0.8457466924))
            Line((0, 0.8457466924), (0, 0.3457466924))
        make_face()
    revolve(axis=Axis((-6.5737103458, -5, -2.8187492767), (-0.5, 0, 0.8660254038)), revolution_arc=F13_T54_ANGLE, mode=Mode.SUBTRACT)

    # F13_s55 → F13_t56 (revolve, cut)
    with BuildSketch(Plane(origin=(6.1508369996, 0, -3.5511873975), x_dir=(0, 1, 0), z_dir=(-0.8660254038, 0, 0.5))):
        with BuildLine():
            ThreePointArc((-0.5, -0.8457466924), (-0.1464466094, -0.699300083), (0, -0.3457466924))
            Line((0, -0.3457466924), (0, -0.8457466924))
            Line((0, -0.8457466924), (-0.5, -0.8457466924))
        make_face()
    revolve(axis=Axis((6.5737103458, -5, -2.8187492767), (-0.5, 0, -0.8660254038)), revolution_arc=F13_T56_ANGLE, mode=Mode.SUBTRACT)


solid = f1_12.part
